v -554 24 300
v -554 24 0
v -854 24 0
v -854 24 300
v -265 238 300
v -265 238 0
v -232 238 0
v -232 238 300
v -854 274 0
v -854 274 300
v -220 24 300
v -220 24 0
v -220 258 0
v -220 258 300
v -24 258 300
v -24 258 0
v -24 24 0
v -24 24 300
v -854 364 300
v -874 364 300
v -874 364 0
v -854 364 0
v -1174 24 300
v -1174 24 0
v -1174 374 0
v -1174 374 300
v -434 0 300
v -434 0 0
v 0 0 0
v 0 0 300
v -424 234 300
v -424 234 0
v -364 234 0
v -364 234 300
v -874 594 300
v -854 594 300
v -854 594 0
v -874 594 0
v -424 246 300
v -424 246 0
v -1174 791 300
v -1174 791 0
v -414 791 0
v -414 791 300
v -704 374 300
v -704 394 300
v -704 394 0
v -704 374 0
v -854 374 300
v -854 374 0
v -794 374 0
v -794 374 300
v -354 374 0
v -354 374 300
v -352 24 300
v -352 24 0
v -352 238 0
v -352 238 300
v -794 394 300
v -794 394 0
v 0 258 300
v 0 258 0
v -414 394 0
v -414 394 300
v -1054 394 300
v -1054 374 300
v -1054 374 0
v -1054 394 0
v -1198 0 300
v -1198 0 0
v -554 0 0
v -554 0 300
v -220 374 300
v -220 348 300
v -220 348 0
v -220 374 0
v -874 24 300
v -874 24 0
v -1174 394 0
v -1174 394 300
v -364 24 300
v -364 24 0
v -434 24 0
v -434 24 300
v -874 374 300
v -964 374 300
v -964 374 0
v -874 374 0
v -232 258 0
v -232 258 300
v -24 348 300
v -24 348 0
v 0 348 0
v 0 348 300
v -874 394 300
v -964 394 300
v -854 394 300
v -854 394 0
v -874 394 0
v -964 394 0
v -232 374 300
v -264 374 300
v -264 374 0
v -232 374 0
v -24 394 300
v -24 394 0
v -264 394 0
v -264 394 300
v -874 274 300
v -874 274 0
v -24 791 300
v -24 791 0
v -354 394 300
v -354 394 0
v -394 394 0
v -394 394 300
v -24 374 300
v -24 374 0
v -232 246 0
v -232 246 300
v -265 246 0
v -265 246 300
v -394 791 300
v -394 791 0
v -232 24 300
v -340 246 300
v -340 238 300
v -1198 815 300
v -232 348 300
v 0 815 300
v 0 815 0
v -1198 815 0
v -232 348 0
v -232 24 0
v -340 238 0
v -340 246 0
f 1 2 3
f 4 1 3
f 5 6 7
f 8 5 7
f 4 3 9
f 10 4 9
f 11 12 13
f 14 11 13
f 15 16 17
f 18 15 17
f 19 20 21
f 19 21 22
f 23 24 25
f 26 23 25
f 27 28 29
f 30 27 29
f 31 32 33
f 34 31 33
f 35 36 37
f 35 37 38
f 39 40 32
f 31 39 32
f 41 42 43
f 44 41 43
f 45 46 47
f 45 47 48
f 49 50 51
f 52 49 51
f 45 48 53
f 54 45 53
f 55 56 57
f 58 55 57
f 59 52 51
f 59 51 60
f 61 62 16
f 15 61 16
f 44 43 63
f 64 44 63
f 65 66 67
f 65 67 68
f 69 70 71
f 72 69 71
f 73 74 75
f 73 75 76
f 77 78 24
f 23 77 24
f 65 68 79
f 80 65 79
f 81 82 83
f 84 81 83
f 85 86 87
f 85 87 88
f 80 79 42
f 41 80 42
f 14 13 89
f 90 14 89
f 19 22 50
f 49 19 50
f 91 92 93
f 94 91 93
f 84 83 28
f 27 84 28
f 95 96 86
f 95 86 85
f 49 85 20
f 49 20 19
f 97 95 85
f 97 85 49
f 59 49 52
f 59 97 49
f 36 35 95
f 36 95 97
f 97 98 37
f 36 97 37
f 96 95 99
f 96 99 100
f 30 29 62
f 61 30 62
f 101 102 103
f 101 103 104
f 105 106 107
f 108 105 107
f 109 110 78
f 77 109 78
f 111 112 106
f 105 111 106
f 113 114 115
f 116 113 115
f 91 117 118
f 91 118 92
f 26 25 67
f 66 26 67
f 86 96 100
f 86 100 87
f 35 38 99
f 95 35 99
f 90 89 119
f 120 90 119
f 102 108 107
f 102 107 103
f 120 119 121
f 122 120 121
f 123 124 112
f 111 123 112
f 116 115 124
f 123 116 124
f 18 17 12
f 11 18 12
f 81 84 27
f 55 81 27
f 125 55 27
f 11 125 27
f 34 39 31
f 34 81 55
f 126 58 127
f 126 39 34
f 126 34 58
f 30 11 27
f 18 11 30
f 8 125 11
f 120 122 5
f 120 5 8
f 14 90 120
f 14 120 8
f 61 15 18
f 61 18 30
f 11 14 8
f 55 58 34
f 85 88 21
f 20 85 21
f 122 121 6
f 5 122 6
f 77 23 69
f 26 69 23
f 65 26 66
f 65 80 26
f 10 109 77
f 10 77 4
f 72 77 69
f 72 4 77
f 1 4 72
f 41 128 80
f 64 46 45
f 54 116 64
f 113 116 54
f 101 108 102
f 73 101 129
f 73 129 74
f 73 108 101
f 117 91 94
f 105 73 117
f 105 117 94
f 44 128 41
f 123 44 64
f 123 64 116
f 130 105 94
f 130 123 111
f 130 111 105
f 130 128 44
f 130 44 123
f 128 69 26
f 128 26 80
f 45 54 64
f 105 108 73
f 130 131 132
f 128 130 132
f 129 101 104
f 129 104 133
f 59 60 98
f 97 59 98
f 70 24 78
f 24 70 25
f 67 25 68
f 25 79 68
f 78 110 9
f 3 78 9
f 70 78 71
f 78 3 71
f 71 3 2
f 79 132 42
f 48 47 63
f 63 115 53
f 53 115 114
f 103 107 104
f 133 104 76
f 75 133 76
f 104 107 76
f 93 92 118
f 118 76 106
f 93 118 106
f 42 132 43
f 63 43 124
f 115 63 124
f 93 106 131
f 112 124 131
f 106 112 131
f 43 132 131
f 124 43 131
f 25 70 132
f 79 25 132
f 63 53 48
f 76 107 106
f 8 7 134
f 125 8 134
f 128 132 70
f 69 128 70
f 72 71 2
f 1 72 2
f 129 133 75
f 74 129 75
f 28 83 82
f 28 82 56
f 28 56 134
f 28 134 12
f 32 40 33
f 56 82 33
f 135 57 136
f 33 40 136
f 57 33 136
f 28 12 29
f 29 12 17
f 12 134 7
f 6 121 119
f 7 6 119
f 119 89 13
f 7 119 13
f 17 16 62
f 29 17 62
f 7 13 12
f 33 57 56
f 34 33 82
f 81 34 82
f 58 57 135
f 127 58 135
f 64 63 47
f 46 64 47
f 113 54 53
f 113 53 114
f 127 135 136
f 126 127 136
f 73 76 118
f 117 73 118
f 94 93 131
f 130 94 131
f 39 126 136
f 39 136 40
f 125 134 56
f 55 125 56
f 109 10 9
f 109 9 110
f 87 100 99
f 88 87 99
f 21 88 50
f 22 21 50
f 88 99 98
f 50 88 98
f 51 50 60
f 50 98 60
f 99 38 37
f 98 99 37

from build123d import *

# Parameters (mm, degrees)
F1_DEPTH = 300


with BuildPart() as f1:
    # F0 (on Top) → F1 (new body)
    with BuildSketch(Plane.XY):
        Polygon((-434, 0), (0, 0), (0, 258), (-24, 258), (-24, 24), (-220, 24), (-232, 24), (-352, 24), (-364, 24), (-434, 24), align=None)
        Polygon((-364, 234), (-364, 24), (-352, 24), (-352, 238), (-340, 238), (-340, 246), (-424, 246), (-424, 234), align=None)
        Polygon((-232, 24), (-220, 24), (-220, 258), (-232, 258), (-232, 246), (-265, 246), (-265, 238), (-232, 238), align=None)
        Polygon((0, 348), (0, 815), (-1198, 815), (-1198, 0), (-554, 0), (-554, 24), (-854, 24), (-854, 274), (-874, 274), (-874, 24), (-1174, 24), (-1174, 374), (-1054, 374), (-1054, 394), (-1174, 394), (-1174, 791), (-414, 791), (-414, 394), (-704, 394), (-704, 374), (-354, 374), (-354, 394), (-394, 394), (-394, 791), (-24, 791), (-24, 394), (-264, 394), (-264, 374), (-232, 374), (-232, 348), (-220, 348), (-220, 374), (-24, 374), (-24, 348), align=None)
        Polygon((-874, 394), (-964, 394), (-964, 374), (-874, 374), (-874, 364), (-854, 364), (-854, 374), (-794, 374), (-794, 394), (-854, 394), (-854, 594), (-874, 594), align=None)
    extrude(amount=F1_DEPTH)


solid = f1.part
